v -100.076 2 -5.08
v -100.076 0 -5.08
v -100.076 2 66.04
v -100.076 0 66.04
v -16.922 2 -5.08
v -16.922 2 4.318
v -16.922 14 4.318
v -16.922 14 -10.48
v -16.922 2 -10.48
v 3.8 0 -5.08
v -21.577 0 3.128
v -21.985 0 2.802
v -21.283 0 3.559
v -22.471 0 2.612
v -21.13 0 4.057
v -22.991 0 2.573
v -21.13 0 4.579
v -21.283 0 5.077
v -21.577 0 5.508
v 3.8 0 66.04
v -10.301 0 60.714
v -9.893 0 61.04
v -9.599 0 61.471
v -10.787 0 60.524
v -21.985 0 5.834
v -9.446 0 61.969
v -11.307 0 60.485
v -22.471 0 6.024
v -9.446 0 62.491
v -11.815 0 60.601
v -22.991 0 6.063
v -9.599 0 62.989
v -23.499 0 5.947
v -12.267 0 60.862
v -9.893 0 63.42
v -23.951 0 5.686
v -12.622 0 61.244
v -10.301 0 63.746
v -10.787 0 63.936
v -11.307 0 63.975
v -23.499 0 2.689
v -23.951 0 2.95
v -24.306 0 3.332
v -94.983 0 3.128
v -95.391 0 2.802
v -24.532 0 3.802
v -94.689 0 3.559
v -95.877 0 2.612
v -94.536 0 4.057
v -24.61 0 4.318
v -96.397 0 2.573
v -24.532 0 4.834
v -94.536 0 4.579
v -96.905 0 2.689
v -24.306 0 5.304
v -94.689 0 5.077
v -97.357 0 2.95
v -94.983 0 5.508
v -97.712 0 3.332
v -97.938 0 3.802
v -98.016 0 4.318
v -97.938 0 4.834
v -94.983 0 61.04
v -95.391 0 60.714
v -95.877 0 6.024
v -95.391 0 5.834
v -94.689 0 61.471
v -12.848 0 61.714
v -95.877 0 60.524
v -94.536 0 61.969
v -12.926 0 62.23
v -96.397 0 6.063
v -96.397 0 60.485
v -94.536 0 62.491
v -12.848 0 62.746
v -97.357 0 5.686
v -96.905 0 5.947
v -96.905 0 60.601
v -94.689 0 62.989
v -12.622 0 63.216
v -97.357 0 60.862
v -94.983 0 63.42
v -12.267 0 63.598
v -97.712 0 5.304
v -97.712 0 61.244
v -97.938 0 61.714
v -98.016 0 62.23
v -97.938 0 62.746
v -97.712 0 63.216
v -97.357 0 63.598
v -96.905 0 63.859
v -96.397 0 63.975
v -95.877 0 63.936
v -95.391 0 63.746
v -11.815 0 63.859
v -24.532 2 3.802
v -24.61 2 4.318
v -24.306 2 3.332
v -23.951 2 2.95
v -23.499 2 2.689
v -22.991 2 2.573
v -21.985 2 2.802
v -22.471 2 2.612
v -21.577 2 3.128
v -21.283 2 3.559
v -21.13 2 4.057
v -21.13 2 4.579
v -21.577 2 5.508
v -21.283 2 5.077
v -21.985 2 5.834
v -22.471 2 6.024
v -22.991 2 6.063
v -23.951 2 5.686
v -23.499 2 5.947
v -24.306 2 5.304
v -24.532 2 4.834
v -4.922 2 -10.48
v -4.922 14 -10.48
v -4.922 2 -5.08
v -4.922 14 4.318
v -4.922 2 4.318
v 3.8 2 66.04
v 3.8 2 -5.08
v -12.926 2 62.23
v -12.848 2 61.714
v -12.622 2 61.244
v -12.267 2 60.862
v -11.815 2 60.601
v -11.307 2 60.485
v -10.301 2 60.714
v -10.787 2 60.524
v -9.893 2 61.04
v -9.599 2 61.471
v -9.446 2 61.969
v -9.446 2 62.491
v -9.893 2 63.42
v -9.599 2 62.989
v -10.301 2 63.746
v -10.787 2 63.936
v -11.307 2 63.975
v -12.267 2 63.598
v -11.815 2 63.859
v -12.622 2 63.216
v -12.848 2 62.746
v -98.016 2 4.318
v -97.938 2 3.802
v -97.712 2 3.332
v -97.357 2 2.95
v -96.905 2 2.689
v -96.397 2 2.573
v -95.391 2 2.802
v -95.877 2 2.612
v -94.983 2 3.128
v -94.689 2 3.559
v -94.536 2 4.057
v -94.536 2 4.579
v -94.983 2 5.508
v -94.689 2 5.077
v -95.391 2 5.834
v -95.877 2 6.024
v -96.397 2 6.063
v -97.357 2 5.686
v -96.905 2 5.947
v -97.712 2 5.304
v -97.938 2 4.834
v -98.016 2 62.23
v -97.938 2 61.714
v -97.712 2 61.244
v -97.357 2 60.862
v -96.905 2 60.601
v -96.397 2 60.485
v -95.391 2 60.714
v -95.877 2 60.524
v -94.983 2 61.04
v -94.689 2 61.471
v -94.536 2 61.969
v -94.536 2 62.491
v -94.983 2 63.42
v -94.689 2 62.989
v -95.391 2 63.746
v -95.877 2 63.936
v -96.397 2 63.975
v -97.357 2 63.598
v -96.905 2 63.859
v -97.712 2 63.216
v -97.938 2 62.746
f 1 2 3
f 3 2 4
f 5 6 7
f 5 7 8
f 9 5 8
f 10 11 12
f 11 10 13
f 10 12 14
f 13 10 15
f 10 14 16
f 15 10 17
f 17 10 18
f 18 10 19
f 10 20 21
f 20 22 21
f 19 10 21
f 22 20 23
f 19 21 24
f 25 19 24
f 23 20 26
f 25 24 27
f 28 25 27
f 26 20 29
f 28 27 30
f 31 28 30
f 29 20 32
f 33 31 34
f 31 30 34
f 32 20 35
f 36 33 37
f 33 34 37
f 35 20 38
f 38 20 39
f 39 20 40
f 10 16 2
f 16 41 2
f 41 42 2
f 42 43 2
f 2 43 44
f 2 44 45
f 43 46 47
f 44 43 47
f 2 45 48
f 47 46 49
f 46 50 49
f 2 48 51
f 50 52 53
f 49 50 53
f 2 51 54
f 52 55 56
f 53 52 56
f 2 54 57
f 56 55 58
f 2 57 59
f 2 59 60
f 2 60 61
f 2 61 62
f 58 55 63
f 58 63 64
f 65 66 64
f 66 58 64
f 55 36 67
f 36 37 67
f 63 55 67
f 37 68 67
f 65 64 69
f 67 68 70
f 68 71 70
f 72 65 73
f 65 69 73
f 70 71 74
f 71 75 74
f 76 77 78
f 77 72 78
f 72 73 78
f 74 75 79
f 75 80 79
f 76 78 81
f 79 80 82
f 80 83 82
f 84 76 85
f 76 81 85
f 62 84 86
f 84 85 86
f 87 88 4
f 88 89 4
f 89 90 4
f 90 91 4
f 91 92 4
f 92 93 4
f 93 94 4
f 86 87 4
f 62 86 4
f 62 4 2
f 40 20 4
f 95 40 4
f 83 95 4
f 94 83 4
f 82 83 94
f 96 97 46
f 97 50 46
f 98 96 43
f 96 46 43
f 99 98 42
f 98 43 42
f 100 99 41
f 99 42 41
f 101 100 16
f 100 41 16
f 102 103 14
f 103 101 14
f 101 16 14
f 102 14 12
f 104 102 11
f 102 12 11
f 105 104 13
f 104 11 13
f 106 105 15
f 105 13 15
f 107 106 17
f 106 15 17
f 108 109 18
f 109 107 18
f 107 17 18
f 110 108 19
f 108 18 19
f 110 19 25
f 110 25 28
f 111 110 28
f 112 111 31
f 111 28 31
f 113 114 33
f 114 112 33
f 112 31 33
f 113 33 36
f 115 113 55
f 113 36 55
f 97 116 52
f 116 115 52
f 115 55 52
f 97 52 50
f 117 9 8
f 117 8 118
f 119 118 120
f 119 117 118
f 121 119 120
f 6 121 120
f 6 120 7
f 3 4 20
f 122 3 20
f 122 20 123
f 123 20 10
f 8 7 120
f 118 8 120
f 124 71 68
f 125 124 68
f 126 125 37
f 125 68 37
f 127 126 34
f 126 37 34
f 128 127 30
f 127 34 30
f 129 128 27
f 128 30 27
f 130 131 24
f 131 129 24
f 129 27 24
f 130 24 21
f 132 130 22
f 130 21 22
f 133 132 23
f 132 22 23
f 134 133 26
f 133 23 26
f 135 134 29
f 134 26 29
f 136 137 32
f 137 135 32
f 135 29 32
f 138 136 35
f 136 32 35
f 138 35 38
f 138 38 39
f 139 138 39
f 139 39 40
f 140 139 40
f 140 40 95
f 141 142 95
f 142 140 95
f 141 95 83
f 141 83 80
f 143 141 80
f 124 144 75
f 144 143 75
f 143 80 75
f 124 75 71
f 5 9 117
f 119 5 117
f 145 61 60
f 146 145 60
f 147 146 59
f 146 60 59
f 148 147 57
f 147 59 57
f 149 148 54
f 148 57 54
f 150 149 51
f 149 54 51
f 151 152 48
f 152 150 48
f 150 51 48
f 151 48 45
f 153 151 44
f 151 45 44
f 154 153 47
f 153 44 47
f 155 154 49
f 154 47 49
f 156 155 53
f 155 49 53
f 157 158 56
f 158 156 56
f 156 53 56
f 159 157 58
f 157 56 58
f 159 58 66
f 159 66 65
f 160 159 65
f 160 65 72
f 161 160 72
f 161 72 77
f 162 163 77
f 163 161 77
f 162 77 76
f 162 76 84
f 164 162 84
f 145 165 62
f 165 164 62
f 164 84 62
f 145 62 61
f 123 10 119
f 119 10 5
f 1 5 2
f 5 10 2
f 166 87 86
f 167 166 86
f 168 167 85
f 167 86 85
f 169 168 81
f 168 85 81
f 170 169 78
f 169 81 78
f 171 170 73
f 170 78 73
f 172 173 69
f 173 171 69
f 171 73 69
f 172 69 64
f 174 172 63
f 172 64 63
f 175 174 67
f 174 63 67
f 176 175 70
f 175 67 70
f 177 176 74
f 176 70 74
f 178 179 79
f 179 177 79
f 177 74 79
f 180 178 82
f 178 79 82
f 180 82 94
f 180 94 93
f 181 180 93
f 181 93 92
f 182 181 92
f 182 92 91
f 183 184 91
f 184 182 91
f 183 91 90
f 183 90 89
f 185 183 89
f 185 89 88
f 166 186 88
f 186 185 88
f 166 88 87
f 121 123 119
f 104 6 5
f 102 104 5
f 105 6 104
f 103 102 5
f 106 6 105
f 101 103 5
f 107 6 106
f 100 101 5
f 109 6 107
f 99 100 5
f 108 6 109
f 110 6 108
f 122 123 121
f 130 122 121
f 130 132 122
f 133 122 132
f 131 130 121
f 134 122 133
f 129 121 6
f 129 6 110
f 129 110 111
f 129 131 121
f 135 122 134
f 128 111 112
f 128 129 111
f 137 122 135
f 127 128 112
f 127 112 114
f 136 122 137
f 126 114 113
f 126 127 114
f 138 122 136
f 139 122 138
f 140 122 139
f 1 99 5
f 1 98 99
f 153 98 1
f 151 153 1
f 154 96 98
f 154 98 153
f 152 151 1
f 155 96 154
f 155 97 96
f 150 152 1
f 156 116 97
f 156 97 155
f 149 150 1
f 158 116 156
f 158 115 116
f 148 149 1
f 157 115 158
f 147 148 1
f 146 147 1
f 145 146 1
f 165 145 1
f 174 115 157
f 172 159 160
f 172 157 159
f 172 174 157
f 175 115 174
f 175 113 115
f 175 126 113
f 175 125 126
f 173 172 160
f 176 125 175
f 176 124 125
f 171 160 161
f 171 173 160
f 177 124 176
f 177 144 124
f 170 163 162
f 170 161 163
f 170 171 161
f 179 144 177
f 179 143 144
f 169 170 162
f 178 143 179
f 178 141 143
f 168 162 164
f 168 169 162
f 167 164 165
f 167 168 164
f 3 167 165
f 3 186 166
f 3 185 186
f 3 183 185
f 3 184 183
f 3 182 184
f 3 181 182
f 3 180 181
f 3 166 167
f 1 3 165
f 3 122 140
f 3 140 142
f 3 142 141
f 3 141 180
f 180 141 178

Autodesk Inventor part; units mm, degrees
ref_plane "YZ Plane" through (0, 0, 0) normal (1, 0, 0) x (0, 1, 0)
ref_plane "XZ Plane" through (0, 0, 0) normal (0, 1, 0) x (-1, 0, 0)
ref_plane "XY Plane" through (0, 0, 0) normal (0, 0, 1) x (1, 0, 0)
sketch "Sketch1" plane through (0, 0, 0) normal (0, 1, 0) x (-1, 0, 0)
  line L0 (-3.8, -5.08) -> (100.076, -5.08)
  line L1 (100.076, -5.08) -> (100.076, 66.04)
  line L2 (100.076, 66.04) -> (-3.8, 66.04)
  line L3 (-3.8, 66.04) -> (-3.8, -5.08)
  circle A0 centre (11.176, 62.23) radius 1.75
  circle A1 centre (96.266, 62.23) radius 1.75
  circle A2 centre (96.266, 4.318) radius 1.75
  circle A3 centre (22.86, 4.318) radius 1.75
  line L4 (10.922, -14.9293) -> (10.922, -25.1011) construction
  point P0 (0, 0)
  dimension "d1" = 3.8
  dimension "d2" = 5.08
  dimension "d3" = 100.076
  dimension "d4" = 66.04
  dimension "d5" = 22.86
  dimension "d6" = 4.318
  dimension "d7" = 3.5
  dimension "d8" = 96.266
  dimension "d9" = 4.318
  dimension "d10" = 3.5
  dimension "d11" = 62.23
  dimension "d12" = 11.176
  dimension "d13" = 3.5
  dimension "d14" = 3.5
  dimension "d15" = 10.922
  dimension "d16" = 11.938
extrude "Extrusion1" add sketch "Sketch1" along normal blind 2
sketch "Sketch2" plane through (0, 2, 0) normal (0, 1, 0) x (1, 0, 0)
  circle A0 centre (-22.86, -4.318) radius 1.75 projected
  line L0 (-16.922, 10.48) -> (-4.922, 10.48)
  line L1 (-4.922, 10.48) -> (-4.922, -4.318)
  line L2 (-4.922, -4.318) -> (-16.922, -4.318)
  line L3 (-16.922, -4.318) -> (-16.922, 10.48)
  line L4 (-10.922, -7.2674) -> (-10.922, -16.4399) construction
  line L5 (3.8, 5.08) -> (-100.076, 5.08) projected
  point P0 (0, 0)
  dimension "d20" = 11.938
  dimension "d21" = 6
  dimension "d22" = 12
  dimension "d25" = 5.4
extrude "Extrusion2" add sketch "Sketch2" along normal blind 12 contours L0 L1 L5 L3 | L5 L1 L2 L3
properties part number "printrboard"
